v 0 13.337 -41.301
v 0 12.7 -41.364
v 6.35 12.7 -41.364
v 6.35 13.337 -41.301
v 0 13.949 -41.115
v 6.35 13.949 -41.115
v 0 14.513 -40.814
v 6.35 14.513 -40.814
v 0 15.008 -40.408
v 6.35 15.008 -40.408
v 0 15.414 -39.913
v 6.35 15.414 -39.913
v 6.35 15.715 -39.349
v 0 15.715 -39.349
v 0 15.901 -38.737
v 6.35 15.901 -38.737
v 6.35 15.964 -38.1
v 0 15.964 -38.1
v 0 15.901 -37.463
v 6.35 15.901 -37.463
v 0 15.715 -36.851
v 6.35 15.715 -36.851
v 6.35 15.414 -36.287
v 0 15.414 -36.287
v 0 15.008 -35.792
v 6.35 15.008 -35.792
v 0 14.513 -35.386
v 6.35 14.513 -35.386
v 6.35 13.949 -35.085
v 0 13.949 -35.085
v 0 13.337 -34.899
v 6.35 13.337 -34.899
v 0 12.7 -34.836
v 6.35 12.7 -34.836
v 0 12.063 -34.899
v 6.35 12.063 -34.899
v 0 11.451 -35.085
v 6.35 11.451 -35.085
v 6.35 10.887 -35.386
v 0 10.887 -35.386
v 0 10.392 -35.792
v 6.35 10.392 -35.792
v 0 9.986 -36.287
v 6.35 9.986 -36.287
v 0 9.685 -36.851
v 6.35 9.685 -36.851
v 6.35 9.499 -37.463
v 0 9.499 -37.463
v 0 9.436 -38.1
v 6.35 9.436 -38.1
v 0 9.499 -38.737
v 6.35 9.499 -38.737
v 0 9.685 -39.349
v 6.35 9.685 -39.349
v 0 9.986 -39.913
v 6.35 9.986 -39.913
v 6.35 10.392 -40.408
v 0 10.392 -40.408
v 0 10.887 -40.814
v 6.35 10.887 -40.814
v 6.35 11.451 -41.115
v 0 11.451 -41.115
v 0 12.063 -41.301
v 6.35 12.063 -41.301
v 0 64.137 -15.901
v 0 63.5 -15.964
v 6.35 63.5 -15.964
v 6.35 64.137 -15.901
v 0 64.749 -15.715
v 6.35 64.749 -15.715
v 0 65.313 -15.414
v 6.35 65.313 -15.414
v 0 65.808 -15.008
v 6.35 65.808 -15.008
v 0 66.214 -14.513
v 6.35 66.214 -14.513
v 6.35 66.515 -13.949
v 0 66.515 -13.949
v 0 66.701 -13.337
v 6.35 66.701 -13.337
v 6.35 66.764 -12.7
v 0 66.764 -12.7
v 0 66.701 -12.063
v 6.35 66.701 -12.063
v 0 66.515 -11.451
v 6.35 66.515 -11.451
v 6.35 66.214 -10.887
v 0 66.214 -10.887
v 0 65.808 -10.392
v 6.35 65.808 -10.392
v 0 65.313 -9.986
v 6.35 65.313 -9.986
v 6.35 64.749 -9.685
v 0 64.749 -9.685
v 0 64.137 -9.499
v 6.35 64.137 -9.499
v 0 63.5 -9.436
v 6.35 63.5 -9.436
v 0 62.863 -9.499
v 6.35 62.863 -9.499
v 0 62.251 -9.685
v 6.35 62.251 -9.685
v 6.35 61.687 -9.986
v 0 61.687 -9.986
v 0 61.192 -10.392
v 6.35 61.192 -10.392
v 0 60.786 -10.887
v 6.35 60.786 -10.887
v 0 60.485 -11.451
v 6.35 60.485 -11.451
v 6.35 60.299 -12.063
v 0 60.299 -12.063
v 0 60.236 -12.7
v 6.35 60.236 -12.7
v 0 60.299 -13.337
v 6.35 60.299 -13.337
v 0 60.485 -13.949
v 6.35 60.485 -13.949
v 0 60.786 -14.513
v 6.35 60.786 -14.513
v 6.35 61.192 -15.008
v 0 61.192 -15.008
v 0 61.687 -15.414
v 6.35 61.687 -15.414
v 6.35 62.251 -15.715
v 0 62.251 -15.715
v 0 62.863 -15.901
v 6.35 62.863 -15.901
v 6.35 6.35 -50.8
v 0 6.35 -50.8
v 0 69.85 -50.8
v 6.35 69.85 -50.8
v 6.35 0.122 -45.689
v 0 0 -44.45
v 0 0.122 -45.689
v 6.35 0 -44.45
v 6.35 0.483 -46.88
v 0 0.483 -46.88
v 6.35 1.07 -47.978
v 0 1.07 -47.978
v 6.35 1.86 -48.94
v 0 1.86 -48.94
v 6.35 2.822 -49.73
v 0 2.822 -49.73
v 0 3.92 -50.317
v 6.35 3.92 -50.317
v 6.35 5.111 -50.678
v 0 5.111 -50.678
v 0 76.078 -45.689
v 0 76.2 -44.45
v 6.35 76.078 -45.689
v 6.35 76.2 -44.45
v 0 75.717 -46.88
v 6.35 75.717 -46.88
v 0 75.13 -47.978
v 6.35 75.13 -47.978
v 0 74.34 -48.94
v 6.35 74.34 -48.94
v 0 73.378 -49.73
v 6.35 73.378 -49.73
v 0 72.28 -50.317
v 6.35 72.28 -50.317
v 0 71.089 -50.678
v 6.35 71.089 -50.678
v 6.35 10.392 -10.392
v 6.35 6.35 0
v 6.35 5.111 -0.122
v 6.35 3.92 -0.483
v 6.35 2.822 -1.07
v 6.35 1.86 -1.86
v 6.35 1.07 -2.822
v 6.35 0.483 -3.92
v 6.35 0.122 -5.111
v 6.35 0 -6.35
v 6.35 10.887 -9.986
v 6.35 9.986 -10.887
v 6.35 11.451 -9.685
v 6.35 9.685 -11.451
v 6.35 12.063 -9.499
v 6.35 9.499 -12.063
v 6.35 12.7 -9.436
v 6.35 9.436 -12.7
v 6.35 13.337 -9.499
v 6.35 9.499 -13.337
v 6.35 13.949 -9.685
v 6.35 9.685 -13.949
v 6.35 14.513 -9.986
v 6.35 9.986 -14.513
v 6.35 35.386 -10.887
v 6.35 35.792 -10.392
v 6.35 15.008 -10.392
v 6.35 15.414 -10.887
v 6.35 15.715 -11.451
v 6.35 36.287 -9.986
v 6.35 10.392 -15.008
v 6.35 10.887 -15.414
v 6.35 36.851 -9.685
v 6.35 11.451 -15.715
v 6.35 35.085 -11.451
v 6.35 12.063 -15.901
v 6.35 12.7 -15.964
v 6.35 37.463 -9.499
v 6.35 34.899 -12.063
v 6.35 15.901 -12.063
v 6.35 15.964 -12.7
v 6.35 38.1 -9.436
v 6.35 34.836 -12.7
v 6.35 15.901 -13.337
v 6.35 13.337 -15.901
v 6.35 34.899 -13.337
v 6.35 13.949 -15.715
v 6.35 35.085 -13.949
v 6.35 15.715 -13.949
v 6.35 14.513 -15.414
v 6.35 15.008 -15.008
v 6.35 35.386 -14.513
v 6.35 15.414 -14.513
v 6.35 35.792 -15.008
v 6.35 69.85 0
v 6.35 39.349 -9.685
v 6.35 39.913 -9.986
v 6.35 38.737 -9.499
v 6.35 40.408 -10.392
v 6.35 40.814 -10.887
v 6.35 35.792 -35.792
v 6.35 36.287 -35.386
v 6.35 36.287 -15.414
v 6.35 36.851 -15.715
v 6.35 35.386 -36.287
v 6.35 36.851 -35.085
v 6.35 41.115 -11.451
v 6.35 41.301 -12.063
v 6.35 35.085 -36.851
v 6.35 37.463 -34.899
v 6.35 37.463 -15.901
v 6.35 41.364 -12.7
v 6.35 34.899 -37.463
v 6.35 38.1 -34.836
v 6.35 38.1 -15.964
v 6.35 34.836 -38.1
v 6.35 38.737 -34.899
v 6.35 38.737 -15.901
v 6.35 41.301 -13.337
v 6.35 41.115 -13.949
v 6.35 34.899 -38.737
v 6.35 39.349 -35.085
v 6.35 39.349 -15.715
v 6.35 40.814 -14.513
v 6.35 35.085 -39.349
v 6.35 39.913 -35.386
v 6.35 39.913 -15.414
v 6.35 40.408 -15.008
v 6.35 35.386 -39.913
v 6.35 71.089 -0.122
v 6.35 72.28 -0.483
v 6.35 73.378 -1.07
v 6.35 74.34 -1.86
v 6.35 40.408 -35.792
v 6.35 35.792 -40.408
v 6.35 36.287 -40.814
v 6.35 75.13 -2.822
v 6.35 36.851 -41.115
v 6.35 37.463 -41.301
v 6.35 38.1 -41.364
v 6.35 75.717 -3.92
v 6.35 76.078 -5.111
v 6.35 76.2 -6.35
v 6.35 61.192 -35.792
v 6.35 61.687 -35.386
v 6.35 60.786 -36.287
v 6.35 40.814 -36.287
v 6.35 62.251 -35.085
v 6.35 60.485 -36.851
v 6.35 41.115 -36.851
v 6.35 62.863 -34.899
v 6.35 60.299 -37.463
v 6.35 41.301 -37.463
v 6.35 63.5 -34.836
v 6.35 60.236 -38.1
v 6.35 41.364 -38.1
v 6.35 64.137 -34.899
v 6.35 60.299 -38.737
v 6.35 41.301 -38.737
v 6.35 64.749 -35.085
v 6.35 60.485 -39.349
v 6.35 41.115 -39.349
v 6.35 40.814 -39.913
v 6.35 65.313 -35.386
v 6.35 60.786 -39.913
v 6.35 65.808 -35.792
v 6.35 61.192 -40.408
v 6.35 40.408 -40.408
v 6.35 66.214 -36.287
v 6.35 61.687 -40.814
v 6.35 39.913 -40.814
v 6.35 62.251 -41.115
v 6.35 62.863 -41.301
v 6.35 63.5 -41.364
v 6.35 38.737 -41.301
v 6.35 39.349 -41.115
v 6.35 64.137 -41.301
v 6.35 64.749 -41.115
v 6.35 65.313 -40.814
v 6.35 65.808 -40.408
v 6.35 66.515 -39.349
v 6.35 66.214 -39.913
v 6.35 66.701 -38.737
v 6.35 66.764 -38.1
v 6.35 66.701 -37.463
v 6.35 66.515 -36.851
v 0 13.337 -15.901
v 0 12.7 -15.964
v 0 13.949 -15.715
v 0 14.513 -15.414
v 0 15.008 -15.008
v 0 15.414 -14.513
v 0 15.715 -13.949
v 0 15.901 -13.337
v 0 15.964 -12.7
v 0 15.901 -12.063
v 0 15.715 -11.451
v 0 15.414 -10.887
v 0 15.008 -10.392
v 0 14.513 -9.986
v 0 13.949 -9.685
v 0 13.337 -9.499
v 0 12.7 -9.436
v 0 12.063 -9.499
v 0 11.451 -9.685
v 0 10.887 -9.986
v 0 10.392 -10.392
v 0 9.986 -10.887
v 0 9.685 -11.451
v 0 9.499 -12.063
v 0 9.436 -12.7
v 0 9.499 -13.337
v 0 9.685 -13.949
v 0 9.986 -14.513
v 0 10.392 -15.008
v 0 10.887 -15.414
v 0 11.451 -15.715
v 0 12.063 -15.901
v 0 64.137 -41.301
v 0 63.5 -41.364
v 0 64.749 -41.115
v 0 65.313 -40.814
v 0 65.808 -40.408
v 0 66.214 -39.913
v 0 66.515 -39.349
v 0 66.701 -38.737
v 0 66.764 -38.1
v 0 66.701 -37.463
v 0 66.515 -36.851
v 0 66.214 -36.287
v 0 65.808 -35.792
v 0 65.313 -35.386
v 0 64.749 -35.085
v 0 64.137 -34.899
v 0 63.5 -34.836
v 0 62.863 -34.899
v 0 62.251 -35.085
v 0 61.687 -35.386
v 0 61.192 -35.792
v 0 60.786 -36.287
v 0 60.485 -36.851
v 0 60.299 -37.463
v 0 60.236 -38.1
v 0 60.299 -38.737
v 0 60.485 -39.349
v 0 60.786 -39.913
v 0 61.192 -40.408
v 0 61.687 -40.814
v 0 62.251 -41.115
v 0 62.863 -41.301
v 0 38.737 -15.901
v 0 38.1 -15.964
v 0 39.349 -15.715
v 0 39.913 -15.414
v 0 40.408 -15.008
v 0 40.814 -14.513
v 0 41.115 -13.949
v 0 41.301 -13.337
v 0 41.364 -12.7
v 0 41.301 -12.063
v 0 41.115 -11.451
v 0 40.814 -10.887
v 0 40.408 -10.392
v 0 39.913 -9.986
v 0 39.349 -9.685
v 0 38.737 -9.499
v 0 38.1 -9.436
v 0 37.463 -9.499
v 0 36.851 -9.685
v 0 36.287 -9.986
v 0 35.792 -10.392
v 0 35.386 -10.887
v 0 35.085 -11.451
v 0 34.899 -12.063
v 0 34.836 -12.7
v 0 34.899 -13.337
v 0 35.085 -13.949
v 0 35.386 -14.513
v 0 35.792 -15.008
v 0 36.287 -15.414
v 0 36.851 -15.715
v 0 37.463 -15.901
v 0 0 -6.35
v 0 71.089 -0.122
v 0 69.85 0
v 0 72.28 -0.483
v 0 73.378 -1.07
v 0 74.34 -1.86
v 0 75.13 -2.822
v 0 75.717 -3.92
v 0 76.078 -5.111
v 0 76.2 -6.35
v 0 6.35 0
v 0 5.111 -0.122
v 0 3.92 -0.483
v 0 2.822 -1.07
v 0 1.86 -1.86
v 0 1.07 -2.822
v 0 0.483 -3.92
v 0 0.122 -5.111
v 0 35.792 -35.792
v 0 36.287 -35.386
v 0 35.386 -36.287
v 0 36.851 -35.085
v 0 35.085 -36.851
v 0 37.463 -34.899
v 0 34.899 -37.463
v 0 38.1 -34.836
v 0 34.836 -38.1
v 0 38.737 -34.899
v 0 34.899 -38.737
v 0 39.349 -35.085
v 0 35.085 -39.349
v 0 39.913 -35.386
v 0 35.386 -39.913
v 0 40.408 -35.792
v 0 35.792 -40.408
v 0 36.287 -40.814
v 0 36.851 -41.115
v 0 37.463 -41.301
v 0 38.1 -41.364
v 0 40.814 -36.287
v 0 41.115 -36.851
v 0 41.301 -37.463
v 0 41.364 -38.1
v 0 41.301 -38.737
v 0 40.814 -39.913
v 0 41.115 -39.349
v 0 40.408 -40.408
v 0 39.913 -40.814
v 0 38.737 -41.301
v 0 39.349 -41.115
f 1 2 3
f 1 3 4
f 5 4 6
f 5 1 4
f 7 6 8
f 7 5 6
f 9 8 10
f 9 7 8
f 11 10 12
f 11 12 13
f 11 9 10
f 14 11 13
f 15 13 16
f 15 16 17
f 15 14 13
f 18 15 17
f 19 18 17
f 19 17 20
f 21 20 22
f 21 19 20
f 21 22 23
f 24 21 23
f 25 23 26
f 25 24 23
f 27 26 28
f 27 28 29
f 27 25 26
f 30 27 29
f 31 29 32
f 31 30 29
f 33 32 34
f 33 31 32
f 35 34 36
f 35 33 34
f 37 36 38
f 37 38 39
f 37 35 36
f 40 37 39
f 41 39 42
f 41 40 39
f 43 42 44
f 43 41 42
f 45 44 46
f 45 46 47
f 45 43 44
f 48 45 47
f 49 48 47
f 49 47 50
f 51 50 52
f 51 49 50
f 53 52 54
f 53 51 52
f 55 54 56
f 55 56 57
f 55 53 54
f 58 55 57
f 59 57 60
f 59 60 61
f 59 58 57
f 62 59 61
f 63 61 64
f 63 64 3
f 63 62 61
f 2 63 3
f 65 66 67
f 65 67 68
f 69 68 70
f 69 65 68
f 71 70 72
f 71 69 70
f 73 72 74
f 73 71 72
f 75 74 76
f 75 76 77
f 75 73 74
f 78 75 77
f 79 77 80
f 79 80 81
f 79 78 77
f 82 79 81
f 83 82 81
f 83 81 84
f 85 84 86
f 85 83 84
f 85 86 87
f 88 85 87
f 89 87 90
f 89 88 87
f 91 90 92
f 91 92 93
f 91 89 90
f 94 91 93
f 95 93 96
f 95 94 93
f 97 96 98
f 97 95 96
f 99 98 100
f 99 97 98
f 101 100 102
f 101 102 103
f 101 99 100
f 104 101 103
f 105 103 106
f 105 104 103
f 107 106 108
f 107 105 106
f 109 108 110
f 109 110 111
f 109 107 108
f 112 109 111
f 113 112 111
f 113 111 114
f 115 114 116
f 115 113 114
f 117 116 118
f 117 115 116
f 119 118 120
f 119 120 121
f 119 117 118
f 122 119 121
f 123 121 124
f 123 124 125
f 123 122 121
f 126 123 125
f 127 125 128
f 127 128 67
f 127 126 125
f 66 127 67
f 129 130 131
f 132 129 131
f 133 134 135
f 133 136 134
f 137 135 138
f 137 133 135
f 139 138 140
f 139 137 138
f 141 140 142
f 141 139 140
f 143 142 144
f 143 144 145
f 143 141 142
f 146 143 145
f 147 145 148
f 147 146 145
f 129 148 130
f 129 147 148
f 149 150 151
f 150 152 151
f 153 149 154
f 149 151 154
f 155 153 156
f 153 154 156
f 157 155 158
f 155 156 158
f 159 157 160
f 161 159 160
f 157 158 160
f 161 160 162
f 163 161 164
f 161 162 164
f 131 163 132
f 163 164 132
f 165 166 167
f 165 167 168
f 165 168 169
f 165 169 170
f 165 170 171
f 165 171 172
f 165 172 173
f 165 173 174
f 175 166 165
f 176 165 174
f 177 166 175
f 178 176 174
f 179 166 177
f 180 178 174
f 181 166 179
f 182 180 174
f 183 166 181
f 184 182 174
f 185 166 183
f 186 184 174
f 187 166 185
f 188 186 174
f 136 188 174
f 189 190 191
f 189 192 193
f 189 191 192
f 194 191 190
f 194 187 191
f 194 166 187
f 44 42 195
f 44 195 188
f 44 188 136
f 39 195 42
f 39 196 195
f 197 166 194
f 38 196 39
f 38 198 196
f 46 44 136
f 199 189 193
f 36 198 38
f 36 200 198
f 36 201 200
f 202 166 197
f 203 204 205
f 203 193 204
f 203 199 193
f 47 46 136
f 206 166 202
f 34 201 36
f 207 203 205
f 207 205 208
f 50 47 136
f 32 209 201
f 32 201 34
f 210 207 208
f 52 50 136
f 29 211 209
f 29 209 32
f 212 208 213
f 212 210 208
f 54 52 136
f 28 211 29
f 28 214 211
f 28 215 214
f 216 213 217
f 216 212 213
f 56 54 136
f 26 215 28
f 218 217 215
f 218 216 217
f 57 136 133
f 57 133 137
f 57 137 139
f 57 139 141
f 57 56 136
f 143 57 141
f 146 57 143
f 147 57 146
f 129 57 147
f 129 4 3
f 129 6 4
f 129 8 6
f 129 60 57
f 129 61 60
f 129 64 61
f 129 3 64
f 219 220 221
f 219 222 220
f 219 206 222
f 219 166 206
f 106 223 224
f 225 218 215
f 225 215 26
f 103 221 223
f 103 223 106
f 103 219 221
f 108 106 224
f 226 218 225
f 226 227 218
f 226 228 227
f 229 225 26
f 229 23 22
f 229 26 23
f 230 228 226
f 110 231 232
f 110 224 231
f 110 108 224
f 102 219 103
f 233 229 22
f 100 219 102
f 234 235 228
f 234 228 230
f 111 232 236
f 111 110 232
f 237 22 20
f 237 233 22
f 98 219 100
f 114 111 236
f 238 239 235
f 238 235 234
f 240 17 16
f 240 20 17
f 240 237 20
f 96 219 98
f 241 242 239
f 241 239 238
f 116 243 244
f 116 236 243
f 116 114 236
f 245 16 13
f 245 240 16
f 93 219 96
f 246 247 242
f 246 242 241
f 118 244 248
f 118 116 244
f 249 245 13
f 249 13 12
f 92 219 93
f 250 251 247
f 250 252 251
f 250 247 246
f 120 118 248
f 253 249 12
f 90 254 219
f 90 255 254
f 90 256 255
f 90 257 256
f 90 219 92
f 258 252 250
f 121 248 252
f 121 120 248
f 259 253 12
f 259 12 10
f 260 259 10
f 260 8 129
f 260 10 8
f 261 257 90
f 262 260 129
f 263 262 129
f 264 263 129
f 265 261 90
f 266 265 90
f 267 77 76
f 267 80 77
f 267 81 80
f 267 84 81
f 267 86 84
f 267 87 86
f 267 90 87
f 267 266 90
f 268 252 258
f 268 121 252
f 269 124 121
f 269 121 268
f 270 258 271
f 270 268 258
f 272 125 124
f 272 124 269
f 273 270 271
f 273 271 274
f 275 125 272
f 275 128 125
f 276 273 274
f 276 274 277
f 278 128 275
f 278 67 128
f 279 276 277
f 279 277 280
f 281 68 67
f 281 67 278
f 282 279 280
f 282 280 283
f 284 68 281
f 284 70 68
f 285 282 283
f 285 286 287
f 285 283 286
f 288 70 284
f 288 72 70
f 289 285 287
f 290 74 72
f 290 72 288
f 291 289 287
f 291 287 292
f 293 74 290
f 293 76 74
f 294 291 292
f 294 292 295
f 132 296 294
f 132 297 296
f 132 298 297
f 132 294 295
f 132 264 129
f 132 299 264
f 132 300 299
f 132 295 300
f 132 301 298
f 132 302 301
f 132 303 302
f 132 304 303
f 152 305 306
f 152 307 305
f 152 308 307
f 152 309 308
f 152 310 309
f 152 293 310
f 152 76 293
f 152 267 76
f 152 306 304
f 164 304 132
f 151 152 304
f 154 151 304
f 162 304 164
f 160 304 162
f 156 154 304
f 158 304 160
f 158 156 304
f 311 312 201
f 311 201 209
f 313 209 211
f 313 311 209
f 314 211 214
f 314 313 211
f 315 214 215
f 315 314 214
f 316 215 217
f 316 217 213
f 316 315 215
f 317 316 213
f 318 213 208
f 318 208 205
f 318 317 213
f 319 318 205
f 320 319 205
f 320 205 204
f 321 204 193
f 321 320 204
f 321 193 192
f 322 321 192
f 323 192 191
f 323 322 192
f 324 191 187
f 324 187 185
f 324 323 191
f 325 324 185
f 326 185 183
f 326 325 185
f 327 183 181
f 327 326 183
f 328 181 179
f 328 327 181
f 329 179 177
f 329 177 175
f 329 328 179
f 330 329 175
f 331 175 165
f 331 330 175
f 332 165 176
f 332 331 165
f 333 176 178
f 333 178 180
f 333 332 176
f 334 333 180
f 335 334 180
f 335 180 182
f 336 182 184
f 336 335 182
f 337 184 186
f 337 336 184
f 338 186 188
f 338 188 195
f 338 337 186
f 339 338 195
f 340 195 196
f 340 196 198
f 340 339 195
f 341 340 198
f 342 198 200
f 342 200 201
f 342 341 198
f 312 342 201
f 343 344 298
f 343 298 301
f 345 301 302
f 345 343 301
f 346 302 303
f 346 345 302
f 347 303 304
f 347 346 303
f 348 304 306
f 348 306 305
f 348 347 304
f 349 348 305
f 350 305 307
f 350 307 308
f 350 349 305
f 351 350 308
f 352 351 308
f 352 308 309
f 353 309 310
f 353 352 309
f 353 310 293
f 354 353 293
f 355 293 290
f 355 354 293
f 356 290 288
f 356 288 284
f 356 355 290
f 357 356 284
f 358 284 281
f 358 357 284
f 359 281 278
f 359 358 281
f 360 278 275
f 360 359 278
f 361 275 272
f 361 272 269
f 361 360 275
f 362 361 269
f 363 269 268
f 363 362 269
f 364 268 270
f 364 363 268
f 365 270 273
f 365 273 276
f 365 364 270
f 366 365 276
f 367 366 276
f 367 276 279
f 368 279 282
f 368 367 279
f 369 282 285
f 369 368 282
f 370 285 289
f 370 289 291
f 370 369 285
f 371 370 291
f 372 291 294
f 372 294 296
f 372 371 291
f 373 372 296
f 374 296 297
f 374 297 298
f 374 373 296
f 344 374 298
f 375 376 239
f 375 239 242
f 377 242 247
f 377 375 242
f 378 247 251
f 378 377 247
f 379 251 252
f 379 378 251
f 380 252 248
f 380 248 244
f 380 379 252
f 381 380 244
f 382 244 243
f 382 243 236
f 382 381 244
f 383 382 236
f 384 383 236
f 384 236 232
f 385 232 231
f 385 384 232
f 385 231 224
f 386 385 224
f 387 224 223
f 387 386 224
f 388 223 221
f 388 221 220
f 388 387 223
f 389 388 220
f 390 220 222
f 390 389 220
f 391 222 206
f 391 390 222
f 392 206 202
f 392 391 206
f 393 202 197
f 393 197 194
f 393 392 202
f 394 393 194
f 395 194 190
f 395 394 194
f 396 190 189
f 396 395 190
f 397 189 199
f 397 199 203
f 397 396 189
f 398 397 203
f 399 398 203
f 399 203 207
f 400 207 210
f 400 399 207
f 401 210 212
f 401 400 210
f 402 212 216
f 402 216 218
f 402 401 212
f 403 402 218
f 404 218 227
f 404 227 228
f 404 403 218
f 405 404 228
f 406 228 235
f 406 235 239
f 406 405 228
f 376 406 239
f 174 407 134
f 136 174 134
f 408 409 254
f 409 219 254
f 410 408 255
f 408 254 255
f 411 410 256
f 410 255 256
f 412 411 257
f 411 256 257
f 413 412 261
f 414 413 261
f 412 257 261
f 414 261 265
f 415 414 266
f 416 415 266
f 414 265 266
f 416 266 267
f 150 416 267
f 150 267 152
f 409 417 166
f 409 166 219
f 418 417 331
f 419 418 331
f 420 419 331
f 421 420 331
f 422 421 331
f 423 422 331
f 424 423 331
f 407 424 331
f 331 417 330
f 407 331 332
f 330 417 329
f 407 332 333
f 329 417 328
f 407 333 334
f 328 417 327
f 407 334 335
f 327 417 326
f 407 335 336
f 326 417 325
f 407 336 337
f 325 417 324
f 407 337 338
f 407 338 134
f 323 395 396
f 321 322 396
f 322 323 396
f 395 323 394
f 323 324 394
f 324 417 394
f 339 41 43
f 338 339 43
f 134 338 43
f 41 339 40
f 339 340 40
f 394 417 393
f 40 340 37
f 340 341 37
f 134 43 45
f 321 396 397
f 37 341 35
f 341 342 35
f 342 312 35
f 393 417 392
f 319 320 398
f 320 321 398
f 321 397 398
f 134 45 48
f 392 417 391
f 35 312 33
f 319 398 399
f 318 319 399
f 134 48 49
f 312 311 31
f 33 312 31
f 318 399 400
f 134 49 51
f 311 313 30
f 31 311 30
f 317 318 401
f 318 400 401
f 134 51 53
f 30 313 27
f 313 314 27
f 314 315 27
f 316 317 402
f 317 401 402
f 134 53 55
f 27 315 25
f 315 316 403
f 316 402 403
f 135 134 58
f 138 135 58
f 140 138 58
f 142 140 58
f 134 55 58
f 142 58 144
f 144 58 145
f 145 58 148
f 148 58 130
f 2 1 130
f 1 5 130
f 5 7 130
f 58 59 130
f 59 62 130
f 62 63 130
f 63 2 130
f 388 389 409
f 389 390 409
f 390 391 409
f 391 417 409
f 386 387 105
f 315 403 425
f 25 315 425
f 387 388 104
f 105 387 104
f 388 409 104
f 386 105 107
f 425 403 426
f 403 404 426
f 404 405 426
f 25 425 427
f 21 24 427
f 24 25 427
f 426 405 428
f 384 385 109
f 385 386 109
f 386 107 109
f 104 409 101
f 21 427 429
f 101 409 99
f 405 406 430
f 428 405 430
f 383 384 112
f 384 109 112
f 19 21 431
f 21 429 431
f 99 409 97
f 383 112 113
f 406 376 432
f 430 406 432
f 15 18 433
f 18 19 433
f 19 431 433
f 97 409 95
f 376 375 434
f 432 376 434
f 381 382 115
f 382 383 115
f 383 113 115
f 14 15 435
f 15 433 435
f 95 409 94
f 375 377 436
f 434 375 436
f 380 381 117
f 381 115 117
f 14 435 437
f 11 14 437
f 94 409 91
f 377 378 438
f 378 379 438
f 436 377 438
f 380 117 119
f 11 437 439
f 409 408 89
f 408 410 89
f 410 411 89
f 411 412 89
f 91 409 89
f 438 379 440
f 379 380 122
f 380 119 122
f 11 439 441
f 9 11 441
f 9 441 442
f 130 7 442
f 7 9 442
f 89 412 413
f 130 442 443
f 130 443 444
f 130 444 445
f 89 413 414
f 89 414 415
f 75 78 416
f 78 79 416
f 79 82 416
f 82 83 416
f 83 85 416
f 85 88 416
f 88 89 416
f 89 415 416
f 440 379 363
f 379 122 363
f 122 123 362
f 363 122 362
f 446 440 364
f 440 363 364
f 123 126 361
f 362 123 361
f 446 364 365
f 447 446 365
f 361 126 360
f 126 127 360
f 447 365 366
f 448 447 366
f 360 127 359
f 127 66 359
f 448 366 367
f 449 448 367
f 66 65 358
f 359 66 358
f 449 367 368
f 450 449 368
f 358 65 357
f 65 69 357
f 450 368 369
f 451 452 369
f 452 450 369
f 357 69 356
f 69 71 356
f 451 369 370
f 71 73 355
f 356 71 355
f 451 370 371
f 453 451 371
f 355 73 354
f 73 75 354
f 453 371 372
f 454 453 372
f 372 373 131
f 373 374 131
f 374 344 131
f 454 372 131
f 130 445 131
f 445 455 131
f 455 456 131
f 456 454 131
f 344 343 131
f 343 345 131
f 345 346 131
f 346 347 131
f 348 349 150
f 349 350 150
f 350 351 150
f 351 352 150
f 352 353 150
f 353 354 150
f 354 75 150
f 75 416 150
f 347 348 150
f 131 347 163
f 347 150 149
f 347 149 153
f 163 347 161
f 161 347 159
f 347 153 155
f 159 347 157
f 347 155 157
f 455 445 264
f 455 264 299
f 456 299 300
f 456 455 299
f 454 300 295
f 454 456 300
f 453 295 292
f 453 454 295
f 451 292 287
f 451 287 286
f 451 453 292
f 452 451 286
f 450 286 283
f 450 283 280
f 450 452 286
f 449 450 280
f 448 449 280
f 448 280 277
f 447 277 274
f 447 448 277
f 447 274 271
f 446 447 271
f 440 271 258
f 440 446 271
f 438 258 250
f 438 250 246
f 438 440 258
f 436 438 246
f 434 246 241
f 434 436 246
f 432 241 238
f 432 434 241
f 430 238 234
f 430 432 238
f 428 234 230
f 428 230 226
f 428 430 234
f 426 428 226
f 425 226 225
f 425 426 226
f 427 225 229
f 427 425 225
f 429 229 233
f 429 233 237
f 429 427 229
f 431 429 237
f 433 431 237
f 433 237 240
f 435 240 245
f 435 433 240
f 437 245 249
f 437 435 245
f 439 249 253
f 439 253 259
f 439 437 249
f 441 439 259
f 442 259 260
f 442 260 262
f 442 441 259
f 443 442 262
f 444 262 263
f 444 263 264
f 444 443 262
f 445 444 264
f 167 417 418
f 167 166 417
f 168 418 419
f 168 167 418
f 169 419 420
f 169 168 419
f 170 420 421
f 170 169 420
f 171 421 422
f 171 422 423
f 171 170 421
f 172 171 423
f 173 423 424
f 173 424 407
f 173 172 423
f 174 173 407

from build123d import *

# Parameters (mm, degrees)
SKETCH1_W      = 50.8
SKETCH1_H      = 76.2
SKETCH1_R      = 3.2639
EXTRUDE1_DEPTH = 6.35
FILLET1_R      = 6.35


with BuildPart() as part:
    # Sketch1 → Extrude1 (new body)
    with BuildSketch(Plane(origin=(0, 0, 0), x_dir=(0, 0, -1), z_dir=(1, 0, 0))):
        with Locations((25.4, 38.1)):
            Rectangle(SKETCH1_W, SKETCH1_H)
        with Locations((12.7, 63.5)):
            Circle(SKETCH1_R, mode=Mode.SUBTRACT)
        with Locations((38.1, 63.5)):
            Circle(SKETCH1_R, mode=Mode.SUBTRACT)
        with Locations((12.7, 38.1)):
            Circle(SKETCH1_R, mode=Mode.SUBTRACT)
        with Locations((38.1, 38.1)):
            Circle(SKETCH1_R, mode=Mode.SUBTRACT)
        with Locations((12.7, 12.7)):
            Circle(SKETCH1_R, mode=Mode.SUBTRACT)
        with Locations((38.1, 12.7)):
            Circle(SKETCH1_R, mode=Mode.SUBTRACT)
    extrude(amount=EXTRUDE1_DEPTH)

    # Fillet1
    fillet1_edges = [part.edges().sort_by_distance(p)[0] for p in [
        (3.175, 76.2, 0),
        (3.175, 76.2, -50.8),
        (3.175, 0, -50.8),
        (3.175, 0, 0),
    ]]
    fillet(fillet1_edges, radius=FILLET1_R)


solid = part.part
